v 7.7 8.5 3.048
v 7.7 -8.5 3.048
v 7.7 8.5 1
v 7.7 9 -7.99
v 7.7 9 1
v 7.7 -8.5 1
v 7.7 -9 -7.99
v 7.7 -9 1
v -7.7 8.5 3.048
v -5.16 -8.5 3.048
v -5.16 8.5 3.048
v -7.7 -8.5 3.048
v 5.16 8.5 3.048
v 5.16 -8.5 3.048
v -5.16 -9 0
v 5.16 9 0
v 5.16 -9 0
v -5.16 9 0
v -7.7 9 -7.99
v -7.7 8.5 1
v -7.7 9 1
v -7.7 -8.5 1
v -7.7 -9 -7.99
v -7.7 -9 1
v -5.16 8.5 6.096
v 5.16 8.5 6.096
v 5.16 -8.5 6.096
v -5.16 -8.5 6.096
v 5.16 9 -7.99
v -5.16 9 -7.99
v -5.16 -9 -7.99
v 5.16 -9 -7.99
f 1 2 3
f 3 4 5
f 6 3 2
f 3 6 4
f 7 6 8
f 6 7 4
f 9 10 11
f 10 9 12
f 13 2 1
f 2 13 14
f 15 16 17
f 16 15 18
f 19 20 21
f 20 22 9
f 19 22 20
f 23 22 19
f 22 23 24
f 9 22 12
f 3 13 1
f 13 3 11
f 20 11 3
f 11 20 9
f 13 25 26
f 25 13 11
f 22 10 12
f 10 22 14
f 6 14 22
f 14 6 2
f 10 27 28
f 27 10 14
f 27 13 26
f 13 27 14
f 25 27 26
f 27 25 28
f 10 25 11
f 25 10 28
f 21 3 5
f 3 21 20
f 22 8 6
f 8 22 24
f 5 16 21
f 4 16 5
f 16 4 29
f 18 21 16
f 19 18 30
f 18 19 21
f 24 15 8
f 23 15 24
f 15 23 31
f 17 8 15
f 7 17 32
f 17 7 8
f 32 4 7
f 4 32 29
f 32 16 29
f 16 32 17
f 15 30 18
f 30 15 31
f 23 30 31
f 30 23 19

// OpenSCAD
/*
Pololu 2808 mini pushbutton power switch

https://www.pololu.com/product/2808
*/

module make_pololu_2808_pushbutton(smd_clearway=1){
    
    angle_header_h = 5+3;//TODO:confirm
    board_w = 15.4;
    board_l = 18;
    
    //smd bb
    color("orange")
    translate([0,0,3.048/2])
    cube([
        board_w,//-2.54*2,
        board_l-1,
        3.048], center=true);
    
    if(smd_clearway)
    color("orange")
    translate([0,0,3.048])
    cube([
        board_w-2.54*2,
        board_l-1,
        3.048*2], center=true);
    
    //board
    color("brown")
    translate([0,0,1/2])
    cube([board_w,board_l,1], center=true);
    
    //angle headers
    translate([board_w/2-2.54/2,0,-(angle_header_h)/2+.01])
    cube([2.54,board_l,angle_header_h], center=true);
    translate([-(board_w/2-2.54/2),0,-(angle_header_h)/2+.01])
    cube([2.54,board_l,angle_header_h], center=true);
    
}
    
make_pololu_2808_pushbutton();
